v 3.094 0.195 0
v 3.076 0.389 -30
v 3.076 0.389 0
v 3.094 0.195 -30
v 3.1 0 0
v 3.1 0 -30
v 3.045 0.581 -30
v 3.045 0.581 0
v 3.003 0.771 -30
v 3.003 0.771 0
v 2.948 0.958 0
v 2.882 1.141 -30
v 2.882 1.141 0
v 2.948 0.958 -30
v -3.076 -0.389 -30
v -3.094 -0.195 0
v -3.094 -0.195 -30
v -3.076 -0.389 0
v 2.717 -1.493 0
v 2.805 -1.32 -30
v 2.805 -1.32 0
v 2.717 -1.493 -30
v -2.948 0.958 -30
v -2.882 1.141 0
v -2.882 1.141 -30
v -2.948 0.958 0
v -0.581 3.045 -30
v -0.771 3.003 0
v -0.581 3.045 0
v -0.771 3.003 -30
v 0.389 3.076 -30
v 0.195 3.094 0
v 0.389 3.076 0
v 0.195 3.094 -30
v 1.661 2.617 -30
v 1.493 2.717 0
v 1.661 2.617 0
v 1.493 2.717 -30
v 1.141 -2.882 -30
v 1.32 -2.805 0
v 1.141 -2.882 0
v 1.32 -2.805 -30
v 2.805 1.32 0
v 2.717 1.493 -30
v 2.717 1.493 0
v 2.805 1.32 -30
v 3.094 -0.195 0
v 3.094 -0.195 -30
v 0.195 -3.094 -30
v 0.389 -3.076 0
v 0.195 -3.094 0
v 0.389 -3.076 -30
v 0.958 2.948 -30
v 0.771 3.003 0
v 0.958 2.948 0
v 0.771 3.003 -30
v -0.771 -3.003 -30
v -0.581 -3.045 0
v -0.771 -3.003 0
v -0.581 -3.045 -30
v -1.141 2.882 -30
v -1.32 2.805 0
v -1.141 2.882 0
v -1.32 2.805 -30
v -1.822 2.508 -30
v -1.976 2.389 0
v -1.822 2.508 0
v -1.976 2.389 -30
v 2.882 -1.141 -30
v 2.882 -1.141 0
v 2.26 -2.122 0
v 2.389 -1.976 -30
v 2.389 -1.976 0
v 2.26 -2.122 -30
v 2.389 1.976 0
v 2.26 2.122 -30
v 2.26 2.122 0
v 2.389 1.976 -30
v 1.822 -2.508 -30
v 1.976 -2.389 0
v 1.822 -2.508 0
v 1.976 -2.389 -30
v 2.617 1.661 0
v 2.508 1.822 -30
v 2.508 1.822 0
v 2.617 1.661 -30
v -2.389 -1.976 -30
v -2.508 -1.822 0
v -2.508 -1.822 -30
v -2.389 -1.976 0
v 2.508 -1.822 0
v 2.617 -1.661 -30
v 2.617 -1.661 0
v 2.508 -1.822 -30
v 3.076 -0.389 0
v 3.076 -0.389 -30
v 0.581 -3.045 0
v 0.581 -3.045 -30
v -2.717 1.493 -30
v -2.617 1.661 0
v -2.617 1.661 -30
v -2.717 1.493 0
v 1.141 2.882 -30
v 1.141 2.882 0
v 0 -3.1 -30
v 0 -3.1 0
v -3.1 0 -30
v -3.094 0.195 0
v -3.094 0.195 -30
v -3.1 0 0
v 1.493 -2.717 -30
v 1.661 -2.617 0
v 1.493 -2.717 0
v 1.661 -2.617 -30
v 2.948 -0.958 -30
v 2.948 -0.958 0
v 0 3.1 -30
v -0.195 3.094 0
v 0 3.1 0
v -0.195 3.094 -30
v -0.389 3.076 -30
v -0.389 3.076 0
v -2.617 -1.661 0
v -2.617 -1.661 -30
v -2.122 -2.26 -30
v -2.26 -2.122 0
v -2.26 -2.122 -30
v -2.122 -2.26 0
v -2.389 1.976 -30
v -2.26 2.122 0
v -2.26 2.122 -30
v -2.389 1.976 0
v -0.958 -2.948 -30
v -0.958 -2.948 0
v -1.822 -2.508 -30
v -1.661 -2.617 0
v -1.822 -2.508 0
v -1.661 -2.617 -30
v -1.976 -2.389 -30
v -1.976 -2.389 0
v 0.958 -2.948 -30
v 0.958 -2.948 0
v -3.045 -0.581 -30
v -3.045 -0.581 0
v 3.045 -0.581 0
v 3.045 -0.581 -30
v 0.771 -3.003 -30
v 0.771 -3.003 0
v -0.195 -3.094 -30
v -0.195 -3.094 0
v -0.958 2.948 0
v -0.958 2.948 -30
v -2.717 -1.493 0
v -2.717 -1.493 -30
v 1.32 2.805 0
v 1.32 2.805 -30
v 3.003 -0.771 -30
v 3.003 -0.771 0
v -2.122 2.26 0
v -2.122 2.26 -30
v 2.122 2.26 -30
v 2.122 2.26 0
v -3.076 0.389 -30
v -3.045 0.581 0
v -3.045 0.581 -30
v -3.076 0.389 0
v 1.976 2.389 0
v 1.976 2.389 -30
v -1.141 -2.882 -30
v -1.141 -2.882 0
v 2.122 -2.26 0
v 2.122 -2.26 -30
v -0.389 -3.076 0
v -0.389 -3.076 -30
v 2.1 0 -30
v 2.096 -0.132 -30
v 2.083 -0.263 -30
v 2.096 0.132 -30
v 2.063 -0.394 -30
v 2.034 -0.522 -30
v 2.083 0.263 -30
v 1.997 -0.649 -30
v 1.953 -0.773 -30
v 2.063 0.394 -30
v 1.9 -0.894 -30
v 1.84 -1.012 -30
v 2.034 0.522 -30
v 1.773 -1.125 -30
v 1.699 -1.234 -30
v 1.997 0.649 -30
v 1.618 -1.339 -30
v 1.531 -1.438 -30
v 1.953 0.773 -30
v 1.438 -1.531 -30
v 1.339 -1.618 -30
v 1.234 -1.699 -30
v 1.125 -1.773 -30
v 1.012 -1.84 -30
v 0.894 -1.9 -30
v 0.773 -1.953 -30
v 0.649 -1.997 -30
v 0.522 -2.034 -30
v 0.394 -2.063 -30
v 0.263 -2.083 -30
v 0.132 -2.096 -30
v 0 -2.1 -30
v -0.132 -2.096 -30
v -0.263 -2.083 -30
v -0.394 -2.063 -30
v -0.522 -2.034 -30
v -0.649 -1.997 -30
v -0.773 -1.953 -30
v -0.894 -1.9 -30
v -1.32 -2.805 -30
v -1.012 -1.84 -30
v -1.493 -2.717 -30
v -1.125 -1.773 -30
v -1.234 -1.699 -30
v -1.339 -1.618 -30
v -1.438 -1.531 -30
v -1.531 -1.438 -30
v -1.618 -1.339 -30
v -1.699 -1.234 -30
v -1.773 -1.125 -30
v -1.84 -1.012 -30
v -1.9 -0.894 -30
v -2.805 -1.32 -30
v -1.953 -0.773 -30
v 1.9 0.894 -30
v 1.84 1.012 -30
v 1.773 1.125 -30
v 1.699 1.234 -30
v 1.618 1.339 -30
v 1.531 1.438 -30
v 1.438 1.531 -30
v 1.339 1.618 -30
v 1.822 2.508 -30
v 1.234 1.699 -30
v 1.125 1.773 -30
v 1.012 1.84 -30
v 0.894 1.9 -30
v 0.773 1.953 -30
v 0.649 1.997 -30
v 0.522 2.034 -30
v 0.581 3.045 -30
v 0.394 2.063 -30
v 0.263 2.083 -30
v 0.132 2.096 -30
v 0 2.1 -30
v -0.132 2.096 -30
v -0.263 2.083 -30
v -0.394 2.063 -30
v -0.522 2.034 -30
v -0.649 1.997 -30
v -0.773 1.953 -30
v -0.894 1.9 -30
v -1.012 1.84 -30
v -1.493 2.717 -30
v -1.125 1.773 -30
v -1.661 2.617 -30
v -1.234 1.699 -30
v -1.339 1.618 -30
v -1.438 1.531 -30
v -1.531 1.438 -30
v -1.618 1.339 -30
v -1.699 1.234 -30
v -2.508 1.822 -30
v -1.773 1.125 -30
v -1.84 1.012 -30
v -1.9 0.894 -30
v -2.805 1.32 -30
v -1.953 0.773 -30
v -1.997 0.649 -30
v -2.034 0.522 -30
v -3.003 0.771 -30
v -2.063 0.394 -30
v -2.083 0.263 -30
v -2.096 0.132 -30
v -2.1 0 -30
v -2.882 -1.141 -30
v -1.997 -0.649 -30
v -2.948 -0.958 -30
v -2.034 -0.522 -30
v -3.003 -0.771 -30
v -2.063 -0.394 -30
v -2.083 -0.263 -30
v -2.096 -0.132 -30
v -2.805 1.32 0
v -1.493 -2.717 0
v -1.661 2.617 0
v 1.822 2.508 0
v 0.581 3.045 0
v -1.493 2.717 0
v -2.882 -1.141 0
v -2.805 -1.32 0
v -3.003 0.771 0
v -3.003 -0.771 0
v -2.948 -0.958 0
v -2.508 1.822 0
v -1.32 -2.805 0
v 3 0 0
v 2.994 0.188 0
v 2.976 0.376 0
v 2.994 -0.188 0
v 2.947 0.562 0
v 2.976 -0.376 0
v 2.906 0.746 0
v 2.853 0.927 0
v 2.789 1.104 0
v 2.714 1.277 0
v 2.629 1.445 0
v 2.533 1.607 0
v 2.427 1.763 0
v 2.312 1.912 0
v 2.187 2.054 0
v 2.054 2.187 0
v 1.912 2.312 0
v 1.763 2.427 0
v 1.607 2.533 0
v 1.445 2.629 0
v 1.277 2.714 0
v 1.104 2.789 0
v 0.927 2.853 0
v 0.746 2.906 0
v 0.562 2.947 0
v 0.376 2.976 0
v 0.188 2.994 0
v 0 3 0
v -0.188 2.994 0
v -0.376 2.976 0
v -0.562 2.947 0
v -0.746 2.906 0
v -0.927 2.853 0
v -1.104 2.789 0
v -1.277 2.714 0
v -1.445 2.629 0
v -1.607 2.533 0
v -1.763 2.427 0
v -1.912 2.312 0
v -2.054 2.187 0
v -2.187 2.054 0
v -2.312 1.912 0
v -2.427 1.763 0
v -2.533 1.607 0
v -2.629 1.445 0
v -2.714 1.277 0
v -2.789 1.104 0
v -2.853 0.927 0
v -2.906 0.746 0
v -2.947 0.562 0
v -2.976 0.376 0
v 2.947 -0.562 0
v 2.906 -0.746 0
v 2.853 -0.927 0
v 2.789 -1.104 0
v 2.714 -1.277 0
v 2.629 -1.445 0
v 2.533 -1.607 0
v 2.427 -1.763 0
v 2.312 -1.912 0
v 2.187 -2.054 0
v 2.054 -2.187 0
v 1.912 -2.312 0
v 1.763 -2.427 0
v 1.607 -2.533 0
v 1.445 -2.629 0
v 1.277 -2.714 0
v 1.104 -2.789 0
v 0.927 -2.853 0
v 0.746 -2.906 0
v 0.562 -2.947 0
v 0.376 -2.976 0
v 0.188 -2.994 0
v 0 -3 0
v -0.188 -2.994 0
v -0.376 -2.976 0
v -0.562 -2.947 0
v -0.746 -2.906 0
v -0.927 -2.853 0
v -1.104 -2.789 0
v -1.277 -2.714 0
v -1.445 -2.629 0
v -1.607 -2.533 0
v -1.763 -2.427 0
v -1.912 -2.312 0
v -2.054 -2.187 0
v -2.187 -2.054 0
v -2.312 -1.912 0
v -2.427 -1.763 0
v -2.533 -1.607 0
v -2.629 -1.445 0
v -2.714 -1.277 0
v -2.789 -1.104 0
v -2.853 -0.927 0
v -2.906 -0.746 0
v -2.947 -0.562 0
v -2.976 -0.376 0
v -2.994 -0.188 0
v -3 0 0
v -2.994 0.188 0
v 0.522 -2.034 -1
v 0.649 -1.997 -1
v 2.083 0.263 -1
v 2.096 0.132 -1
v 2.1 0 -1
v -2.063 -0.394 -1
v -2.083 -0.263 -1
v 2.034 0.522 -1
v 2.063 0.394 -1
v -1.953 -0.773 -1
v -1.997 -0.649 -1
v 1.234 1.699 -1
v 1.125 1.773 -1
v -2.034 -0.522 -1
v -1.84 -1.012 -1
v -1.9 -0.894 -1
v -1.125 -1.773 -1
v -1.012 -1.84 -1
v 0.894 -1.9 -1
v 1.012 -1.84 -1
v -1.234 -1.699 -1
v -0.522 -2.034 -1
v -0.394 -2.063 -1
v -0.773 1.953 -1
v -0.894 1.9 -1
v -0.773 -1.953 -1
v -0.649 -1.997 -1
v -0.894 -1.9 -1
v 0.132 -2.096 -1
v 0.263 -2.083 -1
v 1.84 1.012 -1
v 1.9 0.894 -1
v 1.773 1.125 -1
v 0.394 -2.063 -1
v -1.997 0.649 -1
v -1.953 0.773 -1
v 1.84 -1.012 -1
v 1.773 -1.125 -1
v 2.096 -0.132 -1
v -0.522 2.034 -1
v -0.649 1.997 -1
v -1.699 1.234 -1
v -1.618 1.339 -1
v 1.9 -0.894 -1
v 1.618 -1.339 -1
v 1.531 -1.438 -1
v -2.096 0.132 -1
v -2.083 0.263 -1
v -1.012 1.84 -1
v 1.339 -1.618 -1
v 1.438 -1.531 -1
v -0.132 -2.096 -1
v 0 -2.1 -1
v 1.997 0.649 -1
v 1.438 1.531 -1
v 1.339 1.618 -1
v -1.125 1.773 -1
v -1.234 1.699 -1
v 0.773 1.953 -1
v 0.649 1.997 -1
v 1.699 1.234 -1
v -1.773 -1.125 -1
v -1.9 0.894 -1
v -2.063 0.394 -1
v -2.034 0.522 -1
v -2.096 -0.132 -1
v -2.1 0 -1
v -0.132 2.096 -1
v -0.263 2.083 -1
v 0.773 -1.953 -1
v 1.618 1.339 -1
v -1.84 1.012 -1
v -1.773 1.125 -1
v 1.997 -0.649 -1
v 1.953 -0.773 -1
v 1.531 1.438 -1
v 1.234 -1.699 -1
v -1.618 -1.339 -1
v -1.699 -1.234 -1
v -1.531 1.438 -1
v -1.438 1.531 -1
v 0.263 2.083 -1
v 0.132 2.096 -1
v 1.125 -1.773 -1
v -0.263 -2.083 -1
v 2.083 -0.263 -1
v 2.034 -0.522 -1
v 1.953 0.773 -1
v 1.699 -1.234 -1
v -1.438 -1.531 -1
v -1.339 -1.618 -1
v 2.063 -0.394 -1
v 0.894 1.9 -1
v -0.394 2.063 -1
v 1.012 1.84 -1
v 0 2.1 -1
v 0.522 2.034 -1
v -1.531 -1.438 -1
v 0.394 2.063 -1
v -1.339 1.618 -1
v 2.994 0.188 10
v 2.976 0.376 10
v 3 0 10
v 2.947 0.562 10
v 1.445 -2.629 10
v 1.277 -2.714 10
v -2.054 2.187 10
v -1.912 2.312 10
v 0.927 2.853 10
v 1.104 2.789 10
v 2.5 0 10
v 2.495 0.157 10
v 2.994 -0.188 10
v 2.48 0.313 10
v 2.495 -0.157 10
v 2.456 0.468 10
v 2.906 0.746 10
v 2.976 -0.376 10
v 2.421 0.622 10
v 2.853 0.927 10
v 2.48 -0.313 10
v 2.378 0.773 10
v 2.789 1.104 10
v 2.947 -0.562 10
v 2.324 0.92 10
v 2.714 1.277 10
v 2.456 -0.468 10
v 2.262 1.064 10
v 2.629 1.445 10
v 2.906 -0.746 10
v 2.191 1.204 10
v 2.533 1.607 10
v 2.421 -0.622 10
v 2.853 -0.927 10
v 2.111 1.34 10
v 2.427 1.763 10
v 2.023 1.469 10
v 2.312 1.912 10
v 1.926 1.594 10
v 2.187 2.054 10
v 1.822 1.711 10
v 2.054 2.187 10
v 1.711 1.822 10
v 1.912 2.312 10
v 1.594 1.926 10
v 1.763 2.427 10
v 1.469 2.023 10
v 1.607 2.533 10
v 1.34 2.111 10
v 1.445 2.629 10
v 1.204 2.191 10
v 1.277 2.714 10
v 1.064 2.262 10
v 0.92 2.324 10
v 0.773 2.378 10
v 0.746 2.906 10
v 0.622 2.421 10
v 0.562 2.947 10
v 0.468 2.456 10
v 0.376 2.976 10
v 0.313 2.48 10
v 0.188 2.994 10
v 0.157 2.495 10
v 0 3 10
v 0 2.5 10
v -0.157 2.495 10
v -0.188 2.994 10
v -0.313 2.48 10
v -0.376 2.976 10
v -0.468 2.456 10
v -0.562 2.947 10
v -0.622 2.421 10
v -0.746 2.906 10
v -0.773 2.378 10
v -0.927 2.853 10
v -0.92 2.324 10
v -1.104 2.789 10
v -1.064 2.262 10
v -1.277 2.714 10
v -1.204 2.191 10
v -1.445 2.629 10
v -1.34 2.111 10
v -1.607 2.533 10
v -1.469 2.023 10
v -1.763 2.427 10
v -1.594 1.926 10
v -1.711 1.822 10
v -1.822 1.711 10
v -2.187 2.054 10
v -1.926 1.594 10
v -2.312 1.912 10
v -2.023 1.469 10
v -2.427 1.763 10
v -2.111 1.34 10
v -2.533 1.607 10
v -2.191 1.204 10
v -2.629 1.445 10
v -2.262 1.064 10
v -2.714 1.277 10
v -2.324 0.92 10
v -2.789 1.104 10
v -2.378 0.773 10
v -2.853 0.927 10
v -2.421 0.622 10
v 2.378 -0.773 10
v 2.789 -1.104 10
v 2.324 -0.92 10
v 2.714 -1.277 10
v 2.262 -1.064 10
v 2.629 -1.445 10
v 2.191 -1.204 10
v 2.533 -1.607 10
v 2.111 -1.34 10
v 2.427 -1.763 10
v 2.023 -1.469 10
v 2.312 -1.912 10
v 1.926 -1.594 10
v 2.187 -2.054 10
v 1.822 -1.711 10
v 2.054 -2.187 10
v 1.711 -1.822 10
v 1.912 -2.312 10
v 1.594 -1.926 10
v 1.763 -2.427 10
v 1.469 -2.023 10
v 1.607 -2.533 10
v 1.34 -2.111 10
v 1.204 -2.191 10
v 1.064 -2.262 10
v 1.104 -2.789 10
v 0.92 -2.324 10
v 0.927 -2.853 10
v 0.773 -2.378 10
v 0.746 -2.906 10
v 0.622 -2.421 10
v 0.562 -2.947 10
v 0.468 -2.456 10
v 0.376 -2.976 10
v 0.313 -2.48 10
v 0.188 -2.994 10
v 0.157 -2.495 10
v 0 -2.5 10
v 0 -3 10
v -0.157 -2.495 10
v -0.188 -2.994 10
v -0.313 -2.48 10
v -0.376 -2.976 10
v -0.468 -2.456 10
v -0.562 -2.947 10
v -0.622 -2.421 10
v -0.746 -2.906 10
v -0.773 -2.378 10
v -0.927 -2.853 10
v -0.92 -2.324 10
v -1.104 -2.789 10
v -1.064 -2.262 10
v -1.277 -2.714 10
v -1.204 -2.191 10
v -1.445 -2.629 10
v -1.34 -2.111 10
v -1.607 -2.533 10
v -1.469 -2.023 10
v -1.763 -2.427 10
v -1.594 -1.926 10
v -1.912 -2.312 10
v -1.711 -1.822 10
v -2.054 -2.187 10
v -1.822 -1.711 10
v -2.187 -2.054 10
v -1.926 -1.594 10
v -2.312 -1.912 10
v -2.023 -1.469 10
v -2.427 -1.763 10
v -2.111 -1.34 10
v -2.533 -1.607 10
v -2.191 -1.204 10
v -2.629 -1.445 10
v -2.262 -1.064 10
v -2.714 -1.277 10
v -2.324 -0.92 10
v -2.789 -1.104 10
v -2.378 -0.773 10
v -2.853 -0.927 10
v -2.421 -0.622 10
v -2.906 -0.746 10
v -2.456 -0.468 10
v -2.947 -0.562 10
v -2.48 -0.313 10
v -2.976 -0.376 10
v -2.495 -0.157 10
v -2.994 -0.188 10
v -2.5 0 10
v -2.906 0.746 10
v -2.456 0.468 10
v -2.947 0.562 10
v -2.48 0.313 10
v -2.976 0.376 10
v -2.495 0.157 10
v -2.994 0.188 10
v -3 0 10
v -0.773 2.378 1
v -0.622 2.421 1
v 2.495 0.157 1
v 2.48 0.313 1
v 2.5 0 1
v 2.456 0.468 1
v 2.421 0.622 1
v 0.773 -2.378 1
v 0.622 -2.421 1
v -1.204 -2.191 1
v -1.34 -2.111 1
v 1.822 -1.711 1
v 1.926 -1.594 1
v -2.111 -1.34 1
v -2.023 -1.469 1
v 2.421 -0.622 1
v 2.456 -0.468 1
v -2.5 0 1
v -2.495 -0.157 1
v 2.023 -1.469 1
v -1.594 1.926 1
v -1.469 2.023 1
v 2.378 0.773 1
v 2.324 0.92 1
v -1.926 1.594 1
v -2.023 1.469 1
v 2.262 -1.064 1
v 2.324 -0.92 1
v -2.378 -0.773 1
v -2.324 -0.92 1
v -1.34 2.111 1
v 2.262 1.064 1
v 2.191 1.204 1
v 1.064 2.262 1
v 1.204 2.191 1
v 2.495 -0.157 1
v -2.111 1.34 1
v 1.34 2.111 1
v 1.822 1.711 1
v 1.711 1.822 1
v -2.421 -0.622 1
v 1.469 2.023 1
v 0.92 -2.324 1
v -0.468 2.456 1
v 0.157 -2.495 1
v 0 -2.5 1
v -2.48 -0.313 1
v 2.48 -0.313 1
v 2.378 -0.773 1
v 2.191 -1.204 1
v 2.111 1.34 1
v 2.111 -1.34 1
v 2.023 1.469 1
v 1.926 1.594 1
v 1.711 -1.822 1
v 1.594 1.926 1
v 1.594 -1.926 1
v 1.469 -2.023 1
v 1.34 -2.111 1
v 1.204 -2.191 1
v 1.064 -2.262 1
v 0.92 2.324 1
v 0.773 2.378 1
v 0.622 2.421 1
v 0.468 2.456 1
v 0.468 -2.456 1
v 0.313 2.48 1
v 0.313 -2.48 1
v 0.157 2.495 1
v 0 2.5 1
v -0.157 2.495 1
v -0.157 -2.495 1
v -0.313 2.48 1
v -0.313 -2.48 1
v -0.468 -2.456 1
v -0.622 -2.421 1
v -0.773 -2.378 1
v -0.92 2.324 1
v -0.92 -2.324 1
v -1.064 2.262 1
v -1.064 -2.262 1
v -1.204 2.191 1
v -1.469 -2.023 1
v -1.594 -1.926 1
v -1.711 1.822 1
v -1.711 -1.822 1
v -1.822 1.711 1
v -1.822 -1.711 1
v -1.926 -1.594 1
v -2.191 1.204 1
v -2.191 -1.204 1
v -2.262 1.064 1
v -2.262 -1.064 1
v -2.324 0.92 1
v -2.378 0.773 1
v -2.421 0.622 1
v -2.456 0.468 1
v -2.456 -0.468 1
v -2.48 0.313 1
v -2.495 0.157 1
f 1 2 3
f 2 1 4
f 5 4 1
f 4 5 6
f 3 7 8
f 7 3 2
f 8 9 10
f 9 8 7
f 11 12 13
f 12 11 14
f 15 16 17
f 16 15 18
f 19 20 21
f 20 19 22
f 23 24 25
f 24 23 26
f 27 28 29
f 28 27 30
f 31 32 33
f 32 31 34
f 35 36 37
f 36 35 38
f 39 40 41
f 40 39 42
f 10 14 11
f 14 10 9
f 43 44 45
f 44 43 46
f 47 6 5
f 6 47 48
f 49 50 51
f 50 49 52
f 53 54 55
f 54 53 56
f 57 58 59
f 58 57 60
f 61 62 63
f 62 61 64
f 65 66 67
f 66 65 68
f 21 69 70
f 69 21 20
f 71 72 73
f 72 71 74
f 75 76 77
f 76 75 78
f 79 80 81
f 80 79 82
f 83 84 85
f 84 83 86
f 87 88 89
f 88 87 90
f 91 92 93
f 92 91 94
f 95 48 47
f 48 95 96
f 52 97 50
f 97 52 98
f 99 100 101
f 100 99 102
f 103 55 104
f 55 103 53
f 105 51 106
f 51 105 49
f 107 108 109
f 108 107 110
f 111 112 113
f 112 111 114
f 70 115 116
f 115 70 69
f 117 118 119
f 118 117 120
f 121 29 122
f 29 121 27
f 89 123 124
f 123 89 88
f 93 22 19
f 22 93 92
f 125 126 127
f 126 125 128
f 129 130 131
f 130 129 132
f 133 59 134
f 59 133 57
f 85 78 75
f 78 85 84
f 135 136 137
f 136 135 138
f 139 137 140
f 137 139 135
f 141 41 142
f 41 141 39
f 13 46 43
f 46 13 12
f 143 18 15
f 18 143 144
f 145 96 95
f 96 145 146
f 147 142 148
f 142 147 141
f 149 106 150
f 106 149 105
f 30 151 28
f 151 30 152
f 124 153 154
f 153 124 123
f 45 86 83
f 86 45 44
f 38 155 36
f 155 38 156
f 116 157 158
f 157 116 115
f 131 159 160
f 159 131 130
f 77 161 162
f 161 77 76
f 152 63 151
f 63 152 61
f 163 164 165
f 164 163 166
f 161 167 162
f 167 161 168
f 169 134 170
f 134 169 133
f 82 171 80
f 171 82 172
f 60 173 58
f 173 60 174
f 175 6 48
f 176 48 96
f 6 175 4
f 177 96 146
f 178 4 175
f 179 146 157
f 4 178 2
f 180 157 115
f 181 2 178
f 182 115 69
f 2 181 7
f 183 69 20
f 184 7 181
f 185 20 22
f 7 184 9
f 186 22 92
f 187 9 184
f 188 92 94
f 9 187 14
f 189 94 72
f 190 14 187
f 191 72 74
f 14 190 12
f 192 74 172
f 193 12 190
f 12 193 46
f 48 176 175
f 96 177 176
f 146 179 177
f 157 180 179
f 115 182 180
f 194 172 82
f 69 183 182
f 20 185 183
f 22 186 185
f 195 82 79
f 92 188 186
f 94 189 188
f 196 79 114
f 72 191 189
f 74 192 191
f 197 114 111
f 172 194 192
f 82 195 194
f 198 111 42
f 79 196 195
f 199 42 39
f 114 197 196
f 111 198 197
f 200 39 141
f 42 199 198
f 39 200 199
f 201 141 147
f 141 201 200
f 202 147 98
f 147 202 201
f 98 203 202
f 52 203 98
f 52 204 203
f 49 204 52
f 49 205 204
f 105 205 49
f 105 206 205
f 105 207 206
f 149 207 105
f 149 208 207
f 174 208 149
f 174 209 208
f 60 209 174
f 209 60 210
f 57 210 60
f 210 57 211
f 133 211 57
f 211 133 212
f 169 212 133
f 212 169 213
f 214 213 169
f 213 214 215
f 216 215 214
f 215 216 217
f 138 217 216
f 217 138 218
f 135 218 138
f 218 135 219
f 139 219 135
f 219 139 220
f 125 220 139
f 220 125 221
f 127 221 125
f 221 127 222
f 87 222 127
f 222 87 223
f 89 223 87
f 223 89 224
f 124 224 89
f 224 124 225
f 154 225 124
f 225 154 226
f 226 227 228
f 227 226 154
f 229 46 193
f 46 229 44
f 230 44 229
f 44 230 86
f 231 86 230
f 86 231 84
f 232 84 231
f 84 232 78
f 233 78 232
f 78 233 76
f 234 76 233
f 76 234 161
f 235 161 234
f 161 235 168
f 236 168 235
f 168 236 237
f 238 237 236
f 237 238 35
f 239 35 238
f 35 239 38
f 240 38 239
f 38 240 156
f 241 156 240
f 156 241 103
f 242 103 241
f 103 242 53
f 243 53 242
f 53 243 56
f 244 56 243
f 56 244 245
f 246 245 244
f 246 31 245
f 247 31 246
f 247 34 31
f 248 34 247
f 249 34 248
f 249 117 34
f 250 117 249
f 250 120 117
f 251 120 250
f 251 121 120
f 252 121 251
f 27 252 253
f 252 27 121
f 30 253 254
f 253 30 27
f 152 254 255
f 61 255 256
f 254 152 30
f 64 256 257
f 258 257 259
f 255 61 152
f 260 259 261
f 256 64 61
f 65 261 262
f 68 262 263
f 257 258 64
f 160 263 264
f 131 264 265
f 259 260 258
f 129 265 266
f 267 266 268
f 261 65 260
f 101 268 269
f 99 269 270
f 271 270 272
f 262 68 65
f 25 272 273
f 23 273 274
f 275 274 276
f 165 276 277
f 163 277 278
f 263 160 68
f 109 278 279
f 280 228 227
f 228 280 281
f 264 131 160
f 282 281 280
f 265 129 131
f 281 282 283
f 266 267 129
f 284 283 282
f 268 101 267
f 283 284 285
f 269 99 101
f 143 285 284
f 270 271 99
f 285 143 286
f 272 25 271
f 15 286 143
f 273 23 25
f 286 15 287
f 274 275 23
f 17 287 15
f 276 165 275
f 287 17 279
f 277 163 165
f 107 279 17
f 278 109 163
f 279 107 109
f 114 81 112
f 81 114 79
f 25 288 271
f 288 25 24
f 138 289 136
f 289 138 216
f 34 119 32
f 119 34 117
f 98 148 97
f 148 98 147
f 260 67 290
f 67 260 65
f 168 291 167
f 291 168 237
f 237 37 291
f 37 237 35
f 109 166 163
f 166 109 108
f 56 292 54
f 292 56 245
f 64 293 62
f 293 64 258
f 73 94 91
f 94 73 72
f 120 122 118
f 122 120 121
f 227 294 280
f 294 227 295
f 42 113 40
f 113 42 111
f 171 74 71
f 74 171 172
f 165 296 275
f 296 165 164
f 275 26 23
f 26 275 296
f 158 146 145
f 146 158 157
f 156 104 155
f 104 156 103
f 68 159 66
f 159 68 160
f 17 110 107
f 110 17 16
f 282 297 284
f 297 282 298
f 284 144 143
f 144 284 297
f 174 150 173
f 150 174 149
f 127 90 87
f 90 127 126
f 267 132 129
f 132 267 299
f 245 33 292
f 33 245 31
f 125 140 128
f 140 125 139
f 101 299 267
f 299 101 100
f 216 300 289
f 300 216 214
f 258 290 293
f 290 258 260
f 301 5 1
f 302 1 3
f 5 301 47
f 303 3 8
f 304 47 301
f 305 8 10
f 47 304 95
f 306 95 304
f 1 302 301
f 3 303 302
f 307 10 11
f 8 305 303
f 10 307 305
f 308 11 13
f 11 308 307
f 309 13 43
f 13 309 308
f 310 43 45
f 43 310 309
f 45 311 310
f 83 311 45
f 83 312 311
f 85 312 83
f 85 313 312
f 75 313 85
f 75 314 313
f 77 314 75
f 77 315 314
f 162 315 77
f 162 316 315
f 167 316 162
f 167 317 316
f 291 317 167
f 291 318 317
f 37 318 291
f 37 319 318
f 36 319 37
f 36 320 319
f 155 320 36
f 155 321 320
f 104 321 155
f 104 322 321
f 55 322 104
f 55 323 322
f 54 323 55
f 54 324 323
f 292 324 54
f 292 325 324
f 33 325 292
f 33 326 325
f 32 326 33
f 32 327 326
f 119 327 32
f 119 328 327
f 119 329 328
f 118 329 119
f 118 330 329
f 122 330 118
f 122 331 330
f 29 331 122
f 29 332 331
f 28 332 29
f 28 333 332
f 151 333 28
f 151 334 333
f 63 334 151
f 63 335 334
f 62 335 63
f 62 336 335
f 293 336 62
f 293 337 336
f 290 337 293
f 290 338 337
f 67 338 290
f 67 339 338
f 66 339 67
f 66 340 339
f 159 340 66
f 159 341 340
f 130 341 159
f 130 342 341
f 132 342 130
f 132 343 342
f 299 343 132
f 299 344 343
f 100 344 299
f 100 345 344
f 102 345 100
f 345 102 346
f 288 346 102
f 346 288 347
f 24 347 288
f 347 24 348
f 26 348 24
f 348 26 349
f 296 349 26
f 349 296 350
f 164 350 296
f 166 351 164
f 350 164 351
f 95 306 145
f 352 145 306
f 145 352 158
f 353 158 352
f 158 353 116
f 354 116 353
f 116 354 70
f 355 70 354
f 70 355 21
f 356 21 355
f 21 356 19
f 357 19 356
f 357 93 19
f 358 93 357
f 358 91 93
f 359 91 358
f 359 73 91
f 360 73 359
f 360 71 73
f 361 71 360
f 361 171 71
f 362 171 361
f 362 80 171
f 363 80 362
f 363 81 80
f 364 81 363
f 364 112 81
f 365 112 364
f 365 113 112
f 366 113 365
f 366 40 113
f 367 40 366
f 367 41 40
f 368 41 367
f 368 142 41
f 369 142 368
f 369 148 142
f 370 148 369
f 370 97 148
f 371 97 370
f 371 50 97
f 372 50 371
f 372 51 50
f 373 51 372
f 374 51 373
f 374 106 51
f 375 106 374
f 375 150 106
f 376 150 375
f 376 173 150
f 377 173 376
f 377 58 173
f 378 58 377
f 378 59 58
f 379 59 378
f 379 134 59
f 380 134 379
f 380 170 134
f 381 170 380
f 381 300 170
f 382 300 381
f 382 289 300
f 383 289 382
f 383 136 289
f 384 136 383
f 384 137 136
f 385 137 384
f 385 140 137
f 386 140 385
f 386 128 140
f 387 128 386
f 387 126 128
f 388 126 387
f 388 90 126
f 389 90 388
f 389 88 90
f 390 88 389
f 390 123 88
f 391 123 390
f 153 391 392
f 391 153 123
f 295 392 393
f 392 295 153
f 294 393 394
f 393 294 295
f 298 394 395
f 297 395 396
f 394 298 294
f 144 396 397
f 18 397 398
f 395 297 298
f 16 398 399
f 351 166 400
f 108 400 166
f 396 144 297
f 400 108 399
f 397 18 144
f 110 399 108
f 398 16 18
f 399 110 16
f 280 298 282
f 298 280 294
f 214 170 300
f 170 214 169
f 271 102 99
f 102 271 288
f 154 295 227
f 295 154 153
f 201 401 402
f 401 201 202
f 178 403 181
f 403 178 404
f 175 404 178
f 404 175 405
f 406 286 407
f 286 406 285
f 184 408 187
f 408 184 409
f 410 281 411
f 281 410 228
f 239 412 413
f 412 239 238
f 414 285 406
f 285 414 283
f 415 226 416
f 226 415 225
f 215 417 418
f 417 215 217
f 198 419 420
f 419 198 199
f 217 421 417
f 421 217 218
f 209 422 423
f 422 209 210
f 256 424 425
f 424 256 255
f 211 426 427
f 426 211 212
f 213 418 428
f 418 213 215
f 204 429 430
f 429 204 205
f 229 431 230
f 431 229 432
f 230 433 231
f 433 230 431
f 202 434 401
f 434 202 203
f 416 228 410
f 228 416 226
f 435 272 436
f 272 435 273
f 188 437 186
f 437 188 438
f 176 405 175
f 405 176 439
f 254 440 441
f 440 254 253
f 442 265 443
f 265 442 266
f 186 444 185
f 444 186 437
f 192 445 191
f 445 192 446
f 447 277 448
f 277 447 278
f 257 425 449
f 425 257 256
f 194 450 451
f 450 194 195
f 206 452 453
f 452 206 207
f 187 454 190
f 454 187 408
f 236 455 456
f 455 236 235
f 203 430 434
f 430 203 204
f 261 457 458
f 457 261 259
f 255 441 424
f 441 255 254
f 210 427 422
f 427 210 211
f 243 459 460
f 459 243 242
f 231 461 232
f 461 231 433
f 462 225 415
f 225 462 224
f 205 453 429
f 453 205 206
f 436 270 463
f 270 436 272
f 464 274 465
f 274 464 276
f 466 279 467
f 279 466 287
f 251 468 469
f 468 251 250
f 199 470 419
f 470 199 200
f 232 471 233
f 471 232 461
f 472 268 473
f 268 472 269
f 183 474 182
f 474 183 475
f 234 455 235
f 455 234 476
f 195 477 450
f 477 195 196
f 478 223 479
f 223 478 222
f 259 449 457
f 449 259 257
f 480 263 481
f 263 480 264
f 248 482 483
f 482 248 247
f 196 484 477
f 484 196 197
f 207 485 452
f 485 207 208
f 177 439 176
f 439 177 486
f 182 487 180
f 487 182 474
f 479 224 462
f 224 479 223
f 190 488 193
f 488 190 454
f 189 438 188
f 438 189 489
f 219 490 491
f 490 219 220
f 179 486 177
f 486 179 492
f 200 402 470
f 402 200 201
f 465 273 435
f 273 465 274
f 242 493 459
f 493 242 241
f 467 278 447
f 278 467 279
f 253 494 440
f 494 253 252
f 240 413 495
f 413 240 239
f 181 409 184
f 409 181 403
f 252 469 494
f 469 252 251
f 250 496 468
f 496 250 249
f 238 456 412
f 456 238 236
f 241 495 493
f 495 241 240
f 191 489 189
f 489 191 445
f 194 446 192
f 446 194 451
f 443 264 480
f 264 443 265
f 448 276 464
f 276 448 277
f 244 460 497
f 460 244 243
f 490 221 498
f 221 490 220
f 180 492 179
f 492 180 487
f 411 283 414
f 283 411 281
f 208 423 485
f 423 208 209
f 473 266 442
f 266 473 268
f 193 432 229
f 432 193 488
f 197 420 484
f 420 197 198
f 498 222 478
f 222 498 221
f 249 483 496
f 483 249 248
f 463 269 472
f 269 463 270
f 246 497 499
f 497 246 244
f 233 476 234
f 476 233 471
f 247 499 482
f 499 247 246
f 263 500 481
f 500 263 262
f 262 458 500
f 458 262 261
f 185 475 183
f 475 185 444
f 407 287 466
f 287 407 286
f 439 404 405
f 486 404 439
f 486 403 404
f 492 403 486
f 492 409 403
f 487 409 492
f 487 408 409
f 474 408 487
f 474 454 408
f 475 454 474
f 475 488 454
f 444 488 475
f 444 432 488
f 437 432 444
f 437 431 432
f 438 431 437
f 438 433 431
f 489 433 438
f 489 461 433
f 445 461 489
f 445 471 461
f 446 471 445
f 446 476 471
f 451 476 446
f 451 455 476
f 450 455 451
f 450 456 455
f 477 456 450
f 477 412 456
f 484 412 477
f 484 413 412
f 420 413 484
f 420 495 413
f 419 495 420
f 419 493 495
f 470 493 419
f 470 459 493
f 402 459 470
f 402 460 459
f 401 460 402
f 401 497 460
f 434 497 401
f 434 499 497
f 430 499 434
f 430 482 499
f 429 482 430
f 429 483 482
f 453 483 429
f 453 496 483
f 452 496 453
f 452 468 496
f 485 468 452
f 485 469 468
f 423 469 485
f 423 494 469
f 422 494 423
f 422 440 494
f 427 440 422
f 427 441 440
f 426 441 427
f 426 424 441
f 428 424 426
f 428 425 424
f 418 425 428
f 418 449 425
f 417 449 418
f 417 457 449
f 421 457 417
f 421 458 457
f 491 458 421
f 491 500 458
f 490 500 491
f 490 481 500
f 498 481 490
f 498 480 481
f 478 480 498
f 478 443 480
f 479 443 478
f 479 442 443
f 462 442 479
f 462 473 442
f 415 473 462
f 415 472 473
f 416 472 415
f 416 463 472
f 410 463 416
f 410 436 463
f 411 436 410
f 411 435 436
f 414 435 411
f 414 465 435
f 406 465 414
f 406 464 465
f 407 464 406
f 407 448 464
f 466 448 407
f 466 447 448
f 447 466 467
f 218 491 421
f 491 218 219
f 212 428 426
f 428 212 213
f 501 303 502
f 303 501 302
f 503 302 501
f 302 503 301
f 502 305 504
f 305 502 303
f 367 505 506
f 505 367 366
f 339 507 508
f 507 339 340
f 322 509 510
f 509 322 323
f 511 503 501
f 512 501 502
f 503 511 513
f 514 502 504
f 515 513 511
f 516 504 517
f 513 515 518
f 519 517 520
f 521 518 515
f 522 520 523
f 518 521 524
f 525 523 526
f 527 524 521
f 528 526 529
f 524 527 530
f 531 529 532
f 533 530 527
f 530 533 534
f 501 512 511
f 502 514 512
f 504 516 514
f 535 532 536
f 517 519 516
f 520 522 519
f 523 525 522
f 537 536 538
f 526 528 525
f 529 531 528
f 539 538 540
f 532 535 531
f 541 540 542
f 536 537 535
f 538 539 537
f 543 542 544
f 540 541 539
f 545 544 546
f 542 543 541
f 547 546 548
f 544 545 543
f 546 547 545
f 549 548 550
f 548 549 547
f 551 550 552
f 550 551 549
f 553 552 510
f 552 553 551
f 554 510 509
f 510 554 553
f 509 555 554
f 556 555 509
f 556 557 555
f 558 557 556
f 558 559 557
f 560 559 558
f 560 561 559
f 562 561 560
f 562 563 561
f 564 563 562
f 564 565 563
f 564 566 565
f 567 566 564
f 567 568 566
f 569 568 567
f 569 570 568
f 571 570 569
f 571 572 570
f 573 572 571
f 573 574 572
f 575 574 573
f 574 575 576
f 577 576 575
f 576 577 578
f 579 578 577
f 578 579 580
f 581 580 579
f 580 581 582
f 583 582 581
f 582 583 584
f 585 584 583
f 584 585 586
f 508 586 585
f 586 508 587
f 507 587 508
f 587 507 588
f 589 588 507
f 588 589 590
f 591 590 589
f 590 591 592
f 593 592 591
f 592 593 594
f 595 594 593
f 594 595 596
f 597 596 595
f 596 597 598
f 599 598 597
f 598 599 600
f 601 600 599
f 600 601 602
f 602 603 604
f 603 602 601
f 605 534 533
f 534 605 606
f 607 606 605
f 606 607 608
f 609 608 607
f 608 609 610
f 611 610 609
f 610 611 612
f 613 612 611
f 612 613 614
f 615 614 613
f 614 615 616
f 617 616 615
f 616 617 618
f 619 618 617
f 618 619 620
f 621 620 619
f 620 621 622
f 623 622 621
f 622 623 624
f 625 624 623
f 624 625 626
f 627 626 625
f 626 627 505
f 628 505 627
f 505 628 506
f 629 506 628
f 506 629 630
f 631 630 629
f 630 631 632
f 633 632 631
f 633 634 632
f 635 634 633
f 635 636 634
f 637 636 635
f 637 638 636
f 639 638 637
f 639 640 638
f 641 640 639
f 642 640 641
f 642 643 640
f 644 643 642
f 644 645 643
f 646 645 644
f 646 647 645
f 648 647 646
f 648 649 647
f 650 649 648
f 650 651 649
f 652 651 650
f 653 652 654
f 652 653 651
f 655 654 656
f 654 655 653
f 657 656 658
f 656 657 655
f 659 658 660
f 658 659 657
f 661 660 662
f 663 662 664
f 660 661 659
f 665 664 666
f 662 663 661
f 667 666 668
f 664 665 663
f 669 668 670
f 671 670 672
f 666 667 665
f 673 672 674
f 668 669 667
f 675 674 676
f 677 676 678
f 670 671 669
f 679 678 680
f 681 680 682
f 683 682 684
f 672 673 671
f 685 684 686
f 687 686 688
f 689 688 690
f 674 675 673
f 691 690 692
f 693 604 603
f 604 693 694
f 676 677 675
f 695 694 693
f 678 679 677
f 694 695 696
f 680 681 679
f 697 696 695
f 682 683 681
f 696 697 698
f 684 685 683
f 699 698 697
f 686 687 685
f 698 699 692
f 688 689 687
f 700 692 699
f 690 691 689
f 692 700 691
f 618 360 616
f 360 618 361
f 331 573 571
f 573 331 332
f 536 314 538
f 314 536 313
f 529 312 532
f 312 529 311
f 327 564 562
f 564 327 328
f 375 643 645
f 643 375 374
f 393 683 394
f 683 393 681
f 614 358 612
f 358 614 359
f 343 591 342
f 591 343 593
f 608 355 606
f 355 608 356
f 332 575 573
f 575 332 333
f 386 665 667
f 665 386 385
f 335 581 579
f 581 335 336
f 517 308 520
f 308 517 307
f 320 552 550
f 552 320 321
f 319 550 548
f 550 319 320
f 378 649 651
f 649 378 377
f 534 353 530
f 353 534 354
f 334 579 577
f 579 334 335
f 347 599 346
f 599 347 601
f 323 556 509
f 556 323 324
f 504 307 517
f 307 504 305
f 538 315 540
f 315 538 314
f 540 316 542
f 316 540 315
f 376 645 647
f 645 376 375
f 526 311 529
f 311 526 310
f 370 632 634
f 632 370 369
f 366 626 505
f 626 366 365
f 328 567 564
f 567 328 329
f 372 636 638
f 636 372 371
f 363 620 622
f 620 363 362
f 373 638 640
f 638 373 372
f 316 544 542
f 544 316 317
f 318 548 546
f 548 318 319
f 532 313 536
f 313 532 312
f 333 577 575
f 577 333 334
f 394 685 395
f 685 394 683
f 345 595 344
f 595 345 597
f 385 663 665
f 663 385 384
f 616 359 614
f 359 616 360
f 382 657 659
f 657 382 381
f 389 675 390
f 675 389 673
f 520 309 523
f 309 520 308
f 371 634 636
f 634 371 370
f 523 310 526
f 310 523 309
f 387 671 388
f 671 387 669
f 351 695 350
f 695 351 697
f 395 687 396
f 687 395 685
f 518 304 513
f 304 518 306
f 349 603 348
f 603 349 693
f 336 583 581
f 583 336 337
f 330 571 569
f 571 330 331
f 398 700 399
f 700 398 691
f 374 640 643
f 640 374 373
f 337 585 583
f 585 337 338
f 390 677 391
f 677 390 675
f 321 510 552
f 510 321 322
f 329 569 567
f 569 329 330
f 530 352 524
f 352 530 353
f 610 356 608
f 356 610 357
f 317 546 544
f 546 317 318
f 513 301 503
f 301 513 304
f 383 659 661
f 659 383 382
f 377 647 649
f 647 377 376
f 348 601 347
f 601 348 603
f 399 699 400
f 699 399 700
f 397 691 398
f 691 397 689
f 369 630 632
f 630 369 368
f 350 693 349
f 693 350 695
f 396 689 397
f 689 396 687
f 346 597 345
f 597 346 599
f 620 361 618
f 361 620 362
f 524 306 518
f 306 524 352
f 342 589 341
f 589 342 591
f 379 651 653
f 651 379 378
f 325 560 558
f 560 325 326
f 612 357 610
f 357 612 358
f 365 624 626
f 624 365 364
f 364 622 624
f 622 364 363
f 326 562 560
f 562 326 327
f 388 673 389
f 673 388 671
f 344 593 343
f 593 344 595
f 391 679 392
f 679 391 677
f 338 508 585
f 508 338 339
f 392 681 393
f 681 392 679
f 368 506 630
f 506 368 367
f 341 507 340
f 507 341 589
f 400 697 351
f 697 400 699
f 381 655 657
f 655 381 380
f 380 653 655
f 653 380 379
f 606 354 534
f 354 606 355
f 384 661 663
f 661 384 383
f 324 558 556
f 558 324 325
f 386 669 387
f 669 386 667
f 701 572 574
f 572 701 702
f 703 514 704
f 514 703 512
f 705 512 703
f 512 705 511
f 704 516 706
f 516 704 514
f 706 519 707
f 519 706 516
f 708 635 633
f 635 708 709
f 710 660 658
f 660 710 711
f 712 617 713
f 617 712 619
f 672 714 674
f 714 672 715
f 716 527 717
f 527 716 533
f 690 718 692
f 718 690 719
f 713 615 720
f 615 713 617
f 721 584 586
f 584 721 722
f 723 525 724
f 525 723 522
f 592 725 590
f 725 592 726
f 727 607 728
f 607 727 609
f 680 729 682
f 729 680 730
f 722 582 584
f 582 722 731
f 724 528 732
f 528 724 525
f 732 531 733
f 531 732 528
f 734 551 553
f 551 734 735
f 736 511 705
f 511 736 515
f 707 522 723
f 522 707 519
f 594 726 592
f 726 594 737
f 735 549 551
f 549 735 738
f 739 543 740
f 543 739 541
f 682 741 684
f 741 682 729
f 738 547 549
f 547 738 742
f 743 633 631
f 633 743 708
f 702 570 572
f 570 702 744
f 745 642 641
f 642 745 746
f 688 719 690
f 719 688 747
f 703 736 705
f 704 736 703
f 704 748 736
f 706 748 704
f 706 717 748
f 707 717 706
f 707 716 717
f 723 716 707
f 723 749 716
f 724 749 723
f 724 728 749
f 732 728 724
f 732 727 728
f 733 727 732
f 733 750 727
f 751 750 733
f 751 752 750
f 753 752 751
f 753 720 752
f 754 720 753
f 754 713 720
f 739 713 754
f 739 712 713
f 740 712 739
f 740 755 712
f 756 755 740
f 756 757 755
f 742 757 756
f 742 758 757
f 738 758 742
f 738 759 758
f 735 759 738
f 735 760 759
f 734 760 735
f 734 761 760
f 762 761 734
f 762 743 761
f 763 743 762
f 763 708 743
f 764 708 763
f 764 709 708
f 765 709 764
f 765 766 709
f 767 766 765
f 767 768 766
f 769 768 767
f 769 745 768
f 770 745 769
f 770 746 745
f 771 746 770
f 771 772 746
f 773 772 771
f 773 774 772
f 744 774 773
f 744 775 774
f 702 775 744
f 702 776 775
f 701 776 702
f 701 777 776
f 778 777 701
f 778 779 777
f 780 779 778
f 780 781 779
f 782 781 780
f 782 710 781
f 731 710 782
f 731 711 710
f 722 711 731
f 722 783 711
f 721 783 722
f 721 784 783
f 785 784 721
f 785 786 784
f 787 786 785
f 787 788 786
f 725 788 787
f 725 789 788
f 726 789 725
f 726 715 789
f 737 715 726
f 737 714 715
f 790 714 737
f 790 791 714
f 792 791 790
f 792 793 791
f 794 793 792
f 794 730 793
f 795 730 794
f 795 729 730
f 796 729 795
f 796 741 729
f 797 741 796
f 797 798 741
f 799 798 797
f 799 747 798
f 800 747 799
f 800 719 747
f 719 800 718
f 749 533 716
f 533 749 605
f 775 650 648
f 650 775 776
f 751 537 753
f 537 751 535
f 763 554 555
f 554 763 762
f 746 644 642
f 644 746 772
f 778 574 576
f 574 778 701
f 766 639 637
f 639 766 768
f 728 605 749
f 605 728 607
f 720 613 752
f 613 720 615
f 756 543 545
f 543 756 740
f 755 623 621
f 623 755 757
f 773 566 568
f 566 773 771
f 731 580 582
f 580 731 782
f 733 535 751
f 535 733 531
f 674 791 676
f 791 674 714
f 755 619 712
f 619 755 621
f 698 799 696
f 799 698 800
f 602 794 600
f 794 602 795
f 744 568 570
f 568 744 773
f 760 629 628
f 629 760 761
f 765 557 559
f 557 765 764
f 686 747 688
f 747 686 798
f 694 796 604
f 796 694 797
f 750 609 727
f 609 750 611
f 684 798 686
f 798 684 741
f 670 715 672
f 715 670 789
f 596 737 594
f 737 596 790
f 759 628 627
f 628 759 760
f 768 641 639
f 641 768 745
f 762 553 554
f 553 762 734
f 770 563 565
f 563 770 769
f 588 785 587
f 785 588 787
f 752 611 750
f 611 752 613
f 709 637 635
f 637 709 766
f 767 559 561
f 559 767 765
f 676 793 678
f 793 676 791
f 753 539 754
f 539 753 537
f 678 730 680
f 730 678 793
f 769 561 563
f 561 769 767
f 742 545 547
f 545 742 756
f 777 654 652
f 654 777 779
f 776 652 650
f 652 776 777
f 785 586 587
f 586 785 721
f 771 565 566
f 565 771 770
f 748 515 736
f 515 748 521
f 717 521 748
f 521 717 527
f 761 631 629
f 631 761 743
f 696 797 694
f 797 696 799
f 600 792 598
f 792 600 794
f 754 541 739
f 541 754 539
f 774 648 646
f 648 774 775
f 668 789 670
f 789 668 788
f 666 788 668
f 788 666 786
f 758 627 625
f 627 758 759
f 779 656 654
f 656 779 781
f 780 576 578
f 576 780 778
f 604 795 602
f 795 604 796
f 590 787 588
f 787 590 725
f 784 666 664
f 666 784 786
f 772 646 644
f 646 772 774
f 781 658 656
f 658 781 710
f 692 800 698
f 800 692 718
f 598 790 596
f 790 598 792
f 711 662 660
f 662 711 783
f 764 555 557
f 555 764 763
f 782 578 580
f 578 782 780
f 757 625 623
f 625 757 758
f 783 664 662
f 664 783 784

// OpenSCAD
// file: bottom_pin.scad
$fn=100;

module pin(diameter=6.2, height=10, cap_depth=1)
{
    translate([0,0,-height]) difference(){
        cylinder(d=diameter,h=height);
        cylinder(d=diameter-2,h=height-cap_depth);
    }
}

pin();
// main file
// Sample holder for Ines' zebrafish hearts
$fn = 100;

use <bottom_pin.scad>

// Bottom pin
pin(height=30);

// Cup
height=10;
inner_radius=2.5;
wall_thickness=0.5;
difference() {
    cylinder(h=height, r=inner_radius+wall_thickness);
    translate([0,0,1]) cylinder(h=height, r=inner_radius);
}
